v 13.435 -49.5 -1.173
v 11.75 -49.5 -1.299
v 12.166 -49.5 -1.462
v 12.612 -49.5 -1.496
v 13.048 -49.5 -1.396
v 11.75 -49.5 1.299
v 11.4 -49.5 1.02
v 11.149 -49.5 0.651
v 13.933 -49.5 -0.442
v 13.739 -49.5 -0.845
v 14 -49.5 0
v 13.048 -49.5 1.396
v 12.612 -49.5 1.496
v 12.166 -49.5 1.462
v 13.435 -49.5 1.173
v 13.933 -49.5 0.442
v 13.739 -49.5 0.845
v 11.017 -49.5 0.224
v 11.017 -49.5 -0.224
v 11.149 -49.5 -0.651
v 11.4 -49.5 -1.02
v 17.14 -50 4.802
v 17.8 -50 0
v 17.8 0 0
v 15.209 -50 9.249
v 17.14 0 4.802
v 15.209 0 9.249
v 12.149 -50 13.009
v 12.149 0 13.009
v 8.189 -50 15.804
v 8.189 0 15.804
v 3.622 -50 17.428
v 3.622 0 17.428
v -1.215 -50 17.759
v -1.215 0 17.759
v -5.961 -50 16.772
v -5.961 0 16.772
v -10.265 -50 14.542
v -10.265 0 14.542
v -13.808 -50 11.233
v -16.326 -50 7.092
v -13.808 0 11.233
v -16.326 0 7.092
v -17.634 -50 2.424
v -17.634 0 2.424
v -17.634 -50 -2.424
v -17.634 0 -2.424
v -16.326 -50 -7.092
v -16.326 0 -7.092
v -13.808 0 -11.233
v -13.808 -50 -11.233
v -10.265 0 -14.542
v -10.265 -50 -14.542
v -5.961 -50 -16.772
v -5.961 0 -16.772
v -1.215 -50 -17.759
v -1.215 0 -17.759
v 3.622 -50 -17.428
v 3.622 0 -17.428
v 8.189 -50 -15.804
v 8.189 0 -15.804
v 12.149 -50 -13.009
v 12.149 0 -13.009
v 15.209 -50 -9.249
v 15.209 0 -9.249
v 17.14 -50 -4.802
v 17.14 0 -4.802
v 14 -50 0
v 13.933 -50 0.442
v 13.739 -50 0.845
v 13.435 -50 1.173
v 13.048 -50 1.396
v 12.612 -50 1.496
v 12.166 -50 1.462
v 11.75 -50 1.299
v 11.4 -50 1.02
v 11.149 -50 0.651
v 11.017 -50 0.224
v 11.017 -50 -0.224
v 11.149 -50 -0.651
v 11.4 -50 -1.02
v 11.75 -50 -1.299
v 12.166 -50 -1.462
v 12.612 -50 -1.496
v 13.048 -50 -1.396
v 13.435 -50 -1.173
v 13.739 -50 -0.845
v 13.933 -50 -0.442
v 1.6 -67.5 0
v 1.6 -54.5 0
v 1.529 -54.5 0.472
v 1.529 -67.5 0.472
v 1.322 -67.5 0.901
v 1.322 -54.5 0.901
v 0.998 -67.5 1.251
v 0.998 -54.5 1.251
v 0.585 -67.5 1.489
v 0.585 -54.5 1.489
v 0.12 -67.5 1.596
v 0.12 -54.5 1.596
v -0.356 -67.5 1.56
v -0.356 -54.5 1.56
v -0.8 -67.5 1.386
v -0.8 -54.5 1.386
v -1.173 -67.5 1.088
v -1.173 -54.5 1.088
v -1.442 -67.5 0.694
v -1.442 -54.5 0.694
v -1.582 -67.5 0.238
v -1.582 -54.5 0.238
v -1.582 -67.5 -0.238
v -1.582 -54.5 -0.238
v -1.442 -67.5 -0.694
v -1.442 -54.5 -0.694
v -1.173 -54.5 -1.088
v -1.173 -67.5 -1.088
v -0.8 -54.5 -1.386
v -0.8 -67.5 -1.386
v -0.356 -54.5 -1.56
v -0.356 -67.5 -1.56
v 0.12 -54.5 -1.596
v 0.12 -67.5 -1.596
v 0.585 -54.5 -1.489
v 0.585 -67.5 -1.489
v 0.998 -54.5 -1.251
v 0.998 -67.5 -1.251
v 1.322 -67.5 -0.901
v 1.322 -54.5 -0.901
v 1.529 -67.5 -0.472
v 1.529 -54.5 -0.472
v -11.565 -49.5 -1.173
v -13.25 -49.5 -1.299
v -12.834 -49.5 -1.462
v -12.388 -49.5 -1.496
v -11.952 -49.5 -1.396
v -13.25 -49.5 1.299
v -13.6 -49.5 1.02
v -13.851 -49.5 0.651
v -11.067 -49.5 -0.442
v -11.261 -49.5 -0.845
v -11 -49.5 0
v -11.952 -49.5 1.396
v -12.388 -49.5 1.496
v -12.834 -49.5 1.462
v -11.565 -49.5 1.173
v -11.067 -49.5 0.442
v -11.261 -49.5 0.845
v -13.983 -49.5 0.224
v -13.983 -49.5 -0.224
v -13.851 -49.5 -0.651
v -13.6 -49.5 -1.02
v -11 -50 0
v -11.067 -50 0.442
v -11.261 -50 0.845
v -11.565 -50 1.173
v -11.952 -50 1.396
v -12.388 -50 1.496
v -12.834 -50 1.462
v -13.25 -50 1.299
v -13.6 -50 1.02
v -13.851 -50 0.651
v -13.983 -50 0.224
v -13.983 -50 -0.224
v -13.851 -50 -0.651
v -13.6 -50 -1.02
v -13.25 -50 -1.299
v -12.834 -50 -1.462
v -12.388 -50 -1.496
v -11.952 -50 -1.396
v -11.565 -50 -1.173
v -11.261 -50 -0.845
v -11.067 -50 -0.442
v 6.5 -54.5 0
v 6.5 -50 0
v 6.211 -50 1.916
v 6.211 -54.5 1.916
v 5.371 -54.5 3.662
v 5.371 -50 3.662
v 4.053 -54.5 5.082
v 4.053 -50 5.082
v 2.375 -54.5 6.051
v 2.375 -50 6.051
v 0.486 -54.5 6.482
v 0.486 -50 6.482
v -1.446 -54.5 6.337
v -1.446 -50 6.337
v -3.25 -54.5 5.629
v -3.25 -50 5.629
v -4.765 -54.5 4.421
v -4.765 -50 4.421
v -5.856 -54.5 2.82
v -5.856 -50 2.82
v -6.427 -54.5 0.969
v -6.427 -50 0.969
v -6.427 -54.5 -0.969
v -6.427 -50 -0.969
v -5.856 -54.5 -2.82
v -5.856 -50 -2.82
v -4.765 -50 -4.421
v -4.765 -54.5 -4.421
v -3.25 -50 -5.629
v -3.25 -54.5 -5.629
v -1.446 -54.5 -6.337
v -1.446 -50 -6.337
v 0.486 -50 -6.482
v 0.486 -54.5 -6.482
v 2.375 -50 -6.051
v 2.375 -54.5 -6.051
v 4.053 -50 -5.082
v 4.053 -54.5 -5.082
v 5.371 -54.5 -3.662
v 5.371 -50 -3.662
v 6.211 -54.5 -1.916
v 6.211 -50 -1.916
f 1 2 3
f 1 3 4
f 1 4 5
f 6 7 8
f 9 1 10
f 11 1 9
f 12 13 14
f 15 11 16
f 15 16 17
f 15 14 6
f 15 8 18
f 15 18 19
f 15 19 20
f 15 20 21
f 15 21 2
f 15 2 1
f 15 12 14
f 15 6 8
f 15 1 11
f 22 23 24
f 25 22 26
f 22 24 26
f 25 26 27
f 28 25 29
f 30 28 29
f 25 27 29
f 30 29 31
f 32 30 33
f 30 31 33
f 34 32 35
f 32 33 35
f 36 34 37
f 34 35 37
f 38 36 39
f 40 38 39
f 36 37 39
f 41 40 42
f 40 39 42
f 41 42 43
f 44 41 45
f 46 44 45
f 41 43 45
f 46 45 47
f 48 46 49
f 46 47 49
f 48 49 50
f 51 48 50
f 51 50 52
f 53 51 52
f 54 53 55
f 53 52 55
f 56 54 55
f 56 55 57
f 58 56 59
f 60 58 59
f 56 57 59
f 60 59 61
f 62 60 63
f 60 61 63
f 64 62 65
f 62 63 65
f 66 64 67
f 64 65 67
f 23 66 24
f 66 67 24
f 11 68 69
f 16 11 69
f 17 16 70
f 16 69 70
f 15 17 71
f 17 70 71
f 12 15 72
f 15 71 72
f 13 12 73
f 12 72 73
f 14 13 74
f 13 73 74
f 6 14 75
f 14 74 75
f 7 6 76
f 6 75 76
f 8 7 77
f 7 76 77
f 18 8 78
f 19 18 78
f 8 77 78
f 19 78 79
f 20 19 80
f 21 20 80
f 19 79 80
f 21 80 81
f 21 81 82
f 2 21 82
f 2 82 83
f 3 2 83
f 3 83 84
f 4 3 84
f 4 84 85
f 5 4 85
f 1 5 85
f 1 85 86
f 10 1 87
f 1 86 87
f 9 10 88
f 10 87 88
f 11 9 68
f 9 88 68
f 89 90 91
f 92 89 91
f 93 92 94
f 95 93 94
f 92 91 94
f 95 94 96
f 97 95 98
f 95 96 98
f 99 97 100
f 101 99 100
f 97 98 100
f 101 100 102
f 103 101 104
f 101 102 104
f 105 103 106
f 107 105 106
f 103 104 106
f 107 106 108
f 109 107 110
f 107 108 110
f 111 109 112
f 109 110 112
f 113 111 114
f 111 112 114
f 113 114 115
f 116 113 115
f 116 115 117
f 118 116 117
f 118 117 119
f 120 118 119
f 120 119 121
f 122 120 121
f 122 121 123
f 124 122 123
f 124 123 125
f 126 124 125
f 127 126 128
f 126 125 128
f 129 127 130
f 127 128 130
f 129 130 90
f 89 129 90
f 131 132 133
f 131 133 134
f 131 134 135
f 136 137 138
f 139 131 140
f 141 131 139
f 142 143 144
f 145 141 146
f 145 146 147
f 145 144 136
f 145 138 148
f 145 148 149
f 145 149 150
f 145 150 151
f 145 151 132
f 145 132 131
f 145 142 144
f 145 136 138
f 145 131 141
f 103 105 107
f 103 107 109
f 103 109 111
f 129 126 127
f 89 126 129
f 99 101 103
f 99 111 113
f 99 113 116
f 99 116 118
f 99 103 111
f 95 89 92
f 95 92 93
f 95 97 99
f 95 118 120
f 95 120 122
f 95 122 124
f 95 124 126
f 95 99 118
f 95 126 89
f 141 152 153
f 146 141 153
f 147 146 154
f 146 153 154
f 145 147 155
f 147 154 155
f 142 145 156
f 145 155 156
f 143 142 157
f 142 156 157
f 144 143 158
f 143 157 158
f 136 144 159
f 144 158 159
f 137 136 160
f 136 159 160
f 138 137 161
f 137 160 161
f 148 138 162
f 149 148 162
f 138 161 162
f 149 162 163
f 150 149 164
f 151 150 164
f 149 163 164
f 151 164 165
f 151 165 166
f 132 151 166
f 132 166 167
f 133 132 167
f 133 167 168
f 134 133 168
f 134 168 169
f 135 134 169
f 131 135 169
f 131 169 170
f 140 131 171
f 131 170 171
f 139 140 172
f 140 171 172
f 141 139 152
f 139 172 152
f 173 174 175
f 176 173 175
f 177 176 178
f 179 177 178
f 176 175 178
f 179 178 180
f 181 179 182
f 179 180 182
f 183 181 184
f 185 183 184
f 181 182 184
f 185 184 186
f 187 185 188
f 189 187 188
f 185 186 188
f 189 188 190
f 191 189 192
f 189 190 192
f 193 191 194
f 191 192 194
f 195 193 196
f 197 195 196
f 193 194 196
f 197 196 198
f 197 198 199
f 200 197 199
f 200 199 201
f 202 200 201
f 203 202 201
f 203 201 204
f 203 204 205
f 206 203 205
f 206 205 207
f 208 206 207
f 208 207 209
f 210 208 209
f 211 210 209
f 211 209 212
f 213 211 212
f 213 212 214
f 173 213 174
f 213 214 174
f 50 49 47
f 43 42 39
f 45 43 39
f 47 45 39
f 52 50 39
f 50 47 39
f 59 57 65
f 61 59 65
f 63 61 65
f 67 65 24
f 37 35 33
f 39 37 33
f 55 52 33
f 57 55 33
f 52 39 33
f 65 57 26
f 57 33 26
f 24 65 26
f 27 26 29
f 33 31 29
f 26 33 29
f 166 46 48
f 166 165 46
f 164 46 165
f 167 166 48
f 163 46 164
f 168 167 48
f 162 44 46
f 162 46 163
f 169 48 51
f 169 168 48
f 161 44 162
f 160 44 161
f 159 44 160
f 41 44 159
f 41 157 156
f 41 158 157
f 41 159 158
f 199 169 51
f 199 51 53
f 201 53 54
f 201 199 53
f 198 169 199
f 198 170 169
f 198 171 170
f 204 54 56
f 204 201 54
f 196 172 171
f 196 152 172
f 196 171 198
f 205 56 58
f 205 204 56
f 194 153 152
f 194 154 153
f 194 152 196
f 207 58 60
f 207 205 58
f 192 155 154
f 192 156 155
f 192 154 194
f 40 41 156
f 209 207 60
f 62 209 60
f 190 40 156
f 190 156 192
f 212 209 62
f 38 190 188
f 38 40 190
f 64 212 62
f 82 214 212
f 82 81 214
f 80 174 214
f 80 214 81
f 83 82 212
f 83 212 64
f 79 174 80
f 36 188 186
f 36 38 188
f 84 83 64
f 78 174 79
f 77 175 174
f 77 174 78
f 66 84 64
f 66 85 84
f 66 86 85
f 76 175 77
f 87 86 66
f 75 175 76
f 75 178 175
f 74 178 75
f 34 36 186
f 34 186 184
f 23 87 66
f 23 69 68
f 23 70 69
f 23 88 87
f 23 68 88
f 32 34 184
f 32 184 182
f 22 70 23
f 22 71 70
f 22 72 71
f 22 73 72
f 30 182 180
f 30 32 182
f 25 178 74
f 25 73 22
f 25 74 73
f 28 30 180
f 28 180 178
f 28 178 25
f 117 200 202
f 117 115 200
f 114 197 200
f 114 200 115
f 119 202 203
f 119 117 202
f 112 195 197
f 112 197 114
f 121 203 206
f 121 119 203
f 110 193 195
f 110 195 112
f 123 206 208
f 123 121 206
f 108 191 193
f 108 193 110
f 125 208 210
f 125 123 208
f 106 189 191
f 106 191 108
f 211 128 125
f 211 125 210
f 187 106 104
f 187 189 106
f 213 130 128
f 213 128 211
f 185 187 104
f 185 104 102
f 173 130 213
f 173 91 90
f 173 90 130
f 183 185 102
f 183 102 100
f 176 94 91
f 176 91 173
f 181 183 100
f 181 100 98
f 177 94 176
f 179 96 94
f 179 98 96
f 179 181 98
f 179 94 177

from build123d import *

# Parameters (mm, degrees)
F0_R     = 17.8
F1_DEPTH = 50
F2_R     = 6.5
F3_DEPTH = 4.5
F4_R     = 1.6
F5_DEPTH = 13
F6_R     = 1.5
F7_DEPTH = 0.5


with BuildPart() as f1:
    # F0 (on Front) → F1 (new body)
    with BuildSketch(Plane.XZ):
        Circle(F0_R)
    extrude(amount=F1_DEPTH)

    # F2 (on face) → F3 (join)
    with BuildSketch(Plane.XZ.offset(50)):
        Circle(F2_R)
    extrude(amount=F3_DEPTH)

    # F4 (on face) → F5 (join)
    with BuildSketch(Plane.XZ.offset(54.5)):
        Circle(F4_R)
    extrude(amount=F5_DEPTH)

    # F6 (on face) → F7 (cut)
    with BuildSketch(Plane.XZ.offset(50)):
        with Locations((-12.5, 0)):
            Circle(F6_R)
        with Locations((12.5, 0)):
            Circle(F6_R)
    extrude(amount=-F7_DEPTH, mode=Mode.SUBTRACT)


solid = f1.part
